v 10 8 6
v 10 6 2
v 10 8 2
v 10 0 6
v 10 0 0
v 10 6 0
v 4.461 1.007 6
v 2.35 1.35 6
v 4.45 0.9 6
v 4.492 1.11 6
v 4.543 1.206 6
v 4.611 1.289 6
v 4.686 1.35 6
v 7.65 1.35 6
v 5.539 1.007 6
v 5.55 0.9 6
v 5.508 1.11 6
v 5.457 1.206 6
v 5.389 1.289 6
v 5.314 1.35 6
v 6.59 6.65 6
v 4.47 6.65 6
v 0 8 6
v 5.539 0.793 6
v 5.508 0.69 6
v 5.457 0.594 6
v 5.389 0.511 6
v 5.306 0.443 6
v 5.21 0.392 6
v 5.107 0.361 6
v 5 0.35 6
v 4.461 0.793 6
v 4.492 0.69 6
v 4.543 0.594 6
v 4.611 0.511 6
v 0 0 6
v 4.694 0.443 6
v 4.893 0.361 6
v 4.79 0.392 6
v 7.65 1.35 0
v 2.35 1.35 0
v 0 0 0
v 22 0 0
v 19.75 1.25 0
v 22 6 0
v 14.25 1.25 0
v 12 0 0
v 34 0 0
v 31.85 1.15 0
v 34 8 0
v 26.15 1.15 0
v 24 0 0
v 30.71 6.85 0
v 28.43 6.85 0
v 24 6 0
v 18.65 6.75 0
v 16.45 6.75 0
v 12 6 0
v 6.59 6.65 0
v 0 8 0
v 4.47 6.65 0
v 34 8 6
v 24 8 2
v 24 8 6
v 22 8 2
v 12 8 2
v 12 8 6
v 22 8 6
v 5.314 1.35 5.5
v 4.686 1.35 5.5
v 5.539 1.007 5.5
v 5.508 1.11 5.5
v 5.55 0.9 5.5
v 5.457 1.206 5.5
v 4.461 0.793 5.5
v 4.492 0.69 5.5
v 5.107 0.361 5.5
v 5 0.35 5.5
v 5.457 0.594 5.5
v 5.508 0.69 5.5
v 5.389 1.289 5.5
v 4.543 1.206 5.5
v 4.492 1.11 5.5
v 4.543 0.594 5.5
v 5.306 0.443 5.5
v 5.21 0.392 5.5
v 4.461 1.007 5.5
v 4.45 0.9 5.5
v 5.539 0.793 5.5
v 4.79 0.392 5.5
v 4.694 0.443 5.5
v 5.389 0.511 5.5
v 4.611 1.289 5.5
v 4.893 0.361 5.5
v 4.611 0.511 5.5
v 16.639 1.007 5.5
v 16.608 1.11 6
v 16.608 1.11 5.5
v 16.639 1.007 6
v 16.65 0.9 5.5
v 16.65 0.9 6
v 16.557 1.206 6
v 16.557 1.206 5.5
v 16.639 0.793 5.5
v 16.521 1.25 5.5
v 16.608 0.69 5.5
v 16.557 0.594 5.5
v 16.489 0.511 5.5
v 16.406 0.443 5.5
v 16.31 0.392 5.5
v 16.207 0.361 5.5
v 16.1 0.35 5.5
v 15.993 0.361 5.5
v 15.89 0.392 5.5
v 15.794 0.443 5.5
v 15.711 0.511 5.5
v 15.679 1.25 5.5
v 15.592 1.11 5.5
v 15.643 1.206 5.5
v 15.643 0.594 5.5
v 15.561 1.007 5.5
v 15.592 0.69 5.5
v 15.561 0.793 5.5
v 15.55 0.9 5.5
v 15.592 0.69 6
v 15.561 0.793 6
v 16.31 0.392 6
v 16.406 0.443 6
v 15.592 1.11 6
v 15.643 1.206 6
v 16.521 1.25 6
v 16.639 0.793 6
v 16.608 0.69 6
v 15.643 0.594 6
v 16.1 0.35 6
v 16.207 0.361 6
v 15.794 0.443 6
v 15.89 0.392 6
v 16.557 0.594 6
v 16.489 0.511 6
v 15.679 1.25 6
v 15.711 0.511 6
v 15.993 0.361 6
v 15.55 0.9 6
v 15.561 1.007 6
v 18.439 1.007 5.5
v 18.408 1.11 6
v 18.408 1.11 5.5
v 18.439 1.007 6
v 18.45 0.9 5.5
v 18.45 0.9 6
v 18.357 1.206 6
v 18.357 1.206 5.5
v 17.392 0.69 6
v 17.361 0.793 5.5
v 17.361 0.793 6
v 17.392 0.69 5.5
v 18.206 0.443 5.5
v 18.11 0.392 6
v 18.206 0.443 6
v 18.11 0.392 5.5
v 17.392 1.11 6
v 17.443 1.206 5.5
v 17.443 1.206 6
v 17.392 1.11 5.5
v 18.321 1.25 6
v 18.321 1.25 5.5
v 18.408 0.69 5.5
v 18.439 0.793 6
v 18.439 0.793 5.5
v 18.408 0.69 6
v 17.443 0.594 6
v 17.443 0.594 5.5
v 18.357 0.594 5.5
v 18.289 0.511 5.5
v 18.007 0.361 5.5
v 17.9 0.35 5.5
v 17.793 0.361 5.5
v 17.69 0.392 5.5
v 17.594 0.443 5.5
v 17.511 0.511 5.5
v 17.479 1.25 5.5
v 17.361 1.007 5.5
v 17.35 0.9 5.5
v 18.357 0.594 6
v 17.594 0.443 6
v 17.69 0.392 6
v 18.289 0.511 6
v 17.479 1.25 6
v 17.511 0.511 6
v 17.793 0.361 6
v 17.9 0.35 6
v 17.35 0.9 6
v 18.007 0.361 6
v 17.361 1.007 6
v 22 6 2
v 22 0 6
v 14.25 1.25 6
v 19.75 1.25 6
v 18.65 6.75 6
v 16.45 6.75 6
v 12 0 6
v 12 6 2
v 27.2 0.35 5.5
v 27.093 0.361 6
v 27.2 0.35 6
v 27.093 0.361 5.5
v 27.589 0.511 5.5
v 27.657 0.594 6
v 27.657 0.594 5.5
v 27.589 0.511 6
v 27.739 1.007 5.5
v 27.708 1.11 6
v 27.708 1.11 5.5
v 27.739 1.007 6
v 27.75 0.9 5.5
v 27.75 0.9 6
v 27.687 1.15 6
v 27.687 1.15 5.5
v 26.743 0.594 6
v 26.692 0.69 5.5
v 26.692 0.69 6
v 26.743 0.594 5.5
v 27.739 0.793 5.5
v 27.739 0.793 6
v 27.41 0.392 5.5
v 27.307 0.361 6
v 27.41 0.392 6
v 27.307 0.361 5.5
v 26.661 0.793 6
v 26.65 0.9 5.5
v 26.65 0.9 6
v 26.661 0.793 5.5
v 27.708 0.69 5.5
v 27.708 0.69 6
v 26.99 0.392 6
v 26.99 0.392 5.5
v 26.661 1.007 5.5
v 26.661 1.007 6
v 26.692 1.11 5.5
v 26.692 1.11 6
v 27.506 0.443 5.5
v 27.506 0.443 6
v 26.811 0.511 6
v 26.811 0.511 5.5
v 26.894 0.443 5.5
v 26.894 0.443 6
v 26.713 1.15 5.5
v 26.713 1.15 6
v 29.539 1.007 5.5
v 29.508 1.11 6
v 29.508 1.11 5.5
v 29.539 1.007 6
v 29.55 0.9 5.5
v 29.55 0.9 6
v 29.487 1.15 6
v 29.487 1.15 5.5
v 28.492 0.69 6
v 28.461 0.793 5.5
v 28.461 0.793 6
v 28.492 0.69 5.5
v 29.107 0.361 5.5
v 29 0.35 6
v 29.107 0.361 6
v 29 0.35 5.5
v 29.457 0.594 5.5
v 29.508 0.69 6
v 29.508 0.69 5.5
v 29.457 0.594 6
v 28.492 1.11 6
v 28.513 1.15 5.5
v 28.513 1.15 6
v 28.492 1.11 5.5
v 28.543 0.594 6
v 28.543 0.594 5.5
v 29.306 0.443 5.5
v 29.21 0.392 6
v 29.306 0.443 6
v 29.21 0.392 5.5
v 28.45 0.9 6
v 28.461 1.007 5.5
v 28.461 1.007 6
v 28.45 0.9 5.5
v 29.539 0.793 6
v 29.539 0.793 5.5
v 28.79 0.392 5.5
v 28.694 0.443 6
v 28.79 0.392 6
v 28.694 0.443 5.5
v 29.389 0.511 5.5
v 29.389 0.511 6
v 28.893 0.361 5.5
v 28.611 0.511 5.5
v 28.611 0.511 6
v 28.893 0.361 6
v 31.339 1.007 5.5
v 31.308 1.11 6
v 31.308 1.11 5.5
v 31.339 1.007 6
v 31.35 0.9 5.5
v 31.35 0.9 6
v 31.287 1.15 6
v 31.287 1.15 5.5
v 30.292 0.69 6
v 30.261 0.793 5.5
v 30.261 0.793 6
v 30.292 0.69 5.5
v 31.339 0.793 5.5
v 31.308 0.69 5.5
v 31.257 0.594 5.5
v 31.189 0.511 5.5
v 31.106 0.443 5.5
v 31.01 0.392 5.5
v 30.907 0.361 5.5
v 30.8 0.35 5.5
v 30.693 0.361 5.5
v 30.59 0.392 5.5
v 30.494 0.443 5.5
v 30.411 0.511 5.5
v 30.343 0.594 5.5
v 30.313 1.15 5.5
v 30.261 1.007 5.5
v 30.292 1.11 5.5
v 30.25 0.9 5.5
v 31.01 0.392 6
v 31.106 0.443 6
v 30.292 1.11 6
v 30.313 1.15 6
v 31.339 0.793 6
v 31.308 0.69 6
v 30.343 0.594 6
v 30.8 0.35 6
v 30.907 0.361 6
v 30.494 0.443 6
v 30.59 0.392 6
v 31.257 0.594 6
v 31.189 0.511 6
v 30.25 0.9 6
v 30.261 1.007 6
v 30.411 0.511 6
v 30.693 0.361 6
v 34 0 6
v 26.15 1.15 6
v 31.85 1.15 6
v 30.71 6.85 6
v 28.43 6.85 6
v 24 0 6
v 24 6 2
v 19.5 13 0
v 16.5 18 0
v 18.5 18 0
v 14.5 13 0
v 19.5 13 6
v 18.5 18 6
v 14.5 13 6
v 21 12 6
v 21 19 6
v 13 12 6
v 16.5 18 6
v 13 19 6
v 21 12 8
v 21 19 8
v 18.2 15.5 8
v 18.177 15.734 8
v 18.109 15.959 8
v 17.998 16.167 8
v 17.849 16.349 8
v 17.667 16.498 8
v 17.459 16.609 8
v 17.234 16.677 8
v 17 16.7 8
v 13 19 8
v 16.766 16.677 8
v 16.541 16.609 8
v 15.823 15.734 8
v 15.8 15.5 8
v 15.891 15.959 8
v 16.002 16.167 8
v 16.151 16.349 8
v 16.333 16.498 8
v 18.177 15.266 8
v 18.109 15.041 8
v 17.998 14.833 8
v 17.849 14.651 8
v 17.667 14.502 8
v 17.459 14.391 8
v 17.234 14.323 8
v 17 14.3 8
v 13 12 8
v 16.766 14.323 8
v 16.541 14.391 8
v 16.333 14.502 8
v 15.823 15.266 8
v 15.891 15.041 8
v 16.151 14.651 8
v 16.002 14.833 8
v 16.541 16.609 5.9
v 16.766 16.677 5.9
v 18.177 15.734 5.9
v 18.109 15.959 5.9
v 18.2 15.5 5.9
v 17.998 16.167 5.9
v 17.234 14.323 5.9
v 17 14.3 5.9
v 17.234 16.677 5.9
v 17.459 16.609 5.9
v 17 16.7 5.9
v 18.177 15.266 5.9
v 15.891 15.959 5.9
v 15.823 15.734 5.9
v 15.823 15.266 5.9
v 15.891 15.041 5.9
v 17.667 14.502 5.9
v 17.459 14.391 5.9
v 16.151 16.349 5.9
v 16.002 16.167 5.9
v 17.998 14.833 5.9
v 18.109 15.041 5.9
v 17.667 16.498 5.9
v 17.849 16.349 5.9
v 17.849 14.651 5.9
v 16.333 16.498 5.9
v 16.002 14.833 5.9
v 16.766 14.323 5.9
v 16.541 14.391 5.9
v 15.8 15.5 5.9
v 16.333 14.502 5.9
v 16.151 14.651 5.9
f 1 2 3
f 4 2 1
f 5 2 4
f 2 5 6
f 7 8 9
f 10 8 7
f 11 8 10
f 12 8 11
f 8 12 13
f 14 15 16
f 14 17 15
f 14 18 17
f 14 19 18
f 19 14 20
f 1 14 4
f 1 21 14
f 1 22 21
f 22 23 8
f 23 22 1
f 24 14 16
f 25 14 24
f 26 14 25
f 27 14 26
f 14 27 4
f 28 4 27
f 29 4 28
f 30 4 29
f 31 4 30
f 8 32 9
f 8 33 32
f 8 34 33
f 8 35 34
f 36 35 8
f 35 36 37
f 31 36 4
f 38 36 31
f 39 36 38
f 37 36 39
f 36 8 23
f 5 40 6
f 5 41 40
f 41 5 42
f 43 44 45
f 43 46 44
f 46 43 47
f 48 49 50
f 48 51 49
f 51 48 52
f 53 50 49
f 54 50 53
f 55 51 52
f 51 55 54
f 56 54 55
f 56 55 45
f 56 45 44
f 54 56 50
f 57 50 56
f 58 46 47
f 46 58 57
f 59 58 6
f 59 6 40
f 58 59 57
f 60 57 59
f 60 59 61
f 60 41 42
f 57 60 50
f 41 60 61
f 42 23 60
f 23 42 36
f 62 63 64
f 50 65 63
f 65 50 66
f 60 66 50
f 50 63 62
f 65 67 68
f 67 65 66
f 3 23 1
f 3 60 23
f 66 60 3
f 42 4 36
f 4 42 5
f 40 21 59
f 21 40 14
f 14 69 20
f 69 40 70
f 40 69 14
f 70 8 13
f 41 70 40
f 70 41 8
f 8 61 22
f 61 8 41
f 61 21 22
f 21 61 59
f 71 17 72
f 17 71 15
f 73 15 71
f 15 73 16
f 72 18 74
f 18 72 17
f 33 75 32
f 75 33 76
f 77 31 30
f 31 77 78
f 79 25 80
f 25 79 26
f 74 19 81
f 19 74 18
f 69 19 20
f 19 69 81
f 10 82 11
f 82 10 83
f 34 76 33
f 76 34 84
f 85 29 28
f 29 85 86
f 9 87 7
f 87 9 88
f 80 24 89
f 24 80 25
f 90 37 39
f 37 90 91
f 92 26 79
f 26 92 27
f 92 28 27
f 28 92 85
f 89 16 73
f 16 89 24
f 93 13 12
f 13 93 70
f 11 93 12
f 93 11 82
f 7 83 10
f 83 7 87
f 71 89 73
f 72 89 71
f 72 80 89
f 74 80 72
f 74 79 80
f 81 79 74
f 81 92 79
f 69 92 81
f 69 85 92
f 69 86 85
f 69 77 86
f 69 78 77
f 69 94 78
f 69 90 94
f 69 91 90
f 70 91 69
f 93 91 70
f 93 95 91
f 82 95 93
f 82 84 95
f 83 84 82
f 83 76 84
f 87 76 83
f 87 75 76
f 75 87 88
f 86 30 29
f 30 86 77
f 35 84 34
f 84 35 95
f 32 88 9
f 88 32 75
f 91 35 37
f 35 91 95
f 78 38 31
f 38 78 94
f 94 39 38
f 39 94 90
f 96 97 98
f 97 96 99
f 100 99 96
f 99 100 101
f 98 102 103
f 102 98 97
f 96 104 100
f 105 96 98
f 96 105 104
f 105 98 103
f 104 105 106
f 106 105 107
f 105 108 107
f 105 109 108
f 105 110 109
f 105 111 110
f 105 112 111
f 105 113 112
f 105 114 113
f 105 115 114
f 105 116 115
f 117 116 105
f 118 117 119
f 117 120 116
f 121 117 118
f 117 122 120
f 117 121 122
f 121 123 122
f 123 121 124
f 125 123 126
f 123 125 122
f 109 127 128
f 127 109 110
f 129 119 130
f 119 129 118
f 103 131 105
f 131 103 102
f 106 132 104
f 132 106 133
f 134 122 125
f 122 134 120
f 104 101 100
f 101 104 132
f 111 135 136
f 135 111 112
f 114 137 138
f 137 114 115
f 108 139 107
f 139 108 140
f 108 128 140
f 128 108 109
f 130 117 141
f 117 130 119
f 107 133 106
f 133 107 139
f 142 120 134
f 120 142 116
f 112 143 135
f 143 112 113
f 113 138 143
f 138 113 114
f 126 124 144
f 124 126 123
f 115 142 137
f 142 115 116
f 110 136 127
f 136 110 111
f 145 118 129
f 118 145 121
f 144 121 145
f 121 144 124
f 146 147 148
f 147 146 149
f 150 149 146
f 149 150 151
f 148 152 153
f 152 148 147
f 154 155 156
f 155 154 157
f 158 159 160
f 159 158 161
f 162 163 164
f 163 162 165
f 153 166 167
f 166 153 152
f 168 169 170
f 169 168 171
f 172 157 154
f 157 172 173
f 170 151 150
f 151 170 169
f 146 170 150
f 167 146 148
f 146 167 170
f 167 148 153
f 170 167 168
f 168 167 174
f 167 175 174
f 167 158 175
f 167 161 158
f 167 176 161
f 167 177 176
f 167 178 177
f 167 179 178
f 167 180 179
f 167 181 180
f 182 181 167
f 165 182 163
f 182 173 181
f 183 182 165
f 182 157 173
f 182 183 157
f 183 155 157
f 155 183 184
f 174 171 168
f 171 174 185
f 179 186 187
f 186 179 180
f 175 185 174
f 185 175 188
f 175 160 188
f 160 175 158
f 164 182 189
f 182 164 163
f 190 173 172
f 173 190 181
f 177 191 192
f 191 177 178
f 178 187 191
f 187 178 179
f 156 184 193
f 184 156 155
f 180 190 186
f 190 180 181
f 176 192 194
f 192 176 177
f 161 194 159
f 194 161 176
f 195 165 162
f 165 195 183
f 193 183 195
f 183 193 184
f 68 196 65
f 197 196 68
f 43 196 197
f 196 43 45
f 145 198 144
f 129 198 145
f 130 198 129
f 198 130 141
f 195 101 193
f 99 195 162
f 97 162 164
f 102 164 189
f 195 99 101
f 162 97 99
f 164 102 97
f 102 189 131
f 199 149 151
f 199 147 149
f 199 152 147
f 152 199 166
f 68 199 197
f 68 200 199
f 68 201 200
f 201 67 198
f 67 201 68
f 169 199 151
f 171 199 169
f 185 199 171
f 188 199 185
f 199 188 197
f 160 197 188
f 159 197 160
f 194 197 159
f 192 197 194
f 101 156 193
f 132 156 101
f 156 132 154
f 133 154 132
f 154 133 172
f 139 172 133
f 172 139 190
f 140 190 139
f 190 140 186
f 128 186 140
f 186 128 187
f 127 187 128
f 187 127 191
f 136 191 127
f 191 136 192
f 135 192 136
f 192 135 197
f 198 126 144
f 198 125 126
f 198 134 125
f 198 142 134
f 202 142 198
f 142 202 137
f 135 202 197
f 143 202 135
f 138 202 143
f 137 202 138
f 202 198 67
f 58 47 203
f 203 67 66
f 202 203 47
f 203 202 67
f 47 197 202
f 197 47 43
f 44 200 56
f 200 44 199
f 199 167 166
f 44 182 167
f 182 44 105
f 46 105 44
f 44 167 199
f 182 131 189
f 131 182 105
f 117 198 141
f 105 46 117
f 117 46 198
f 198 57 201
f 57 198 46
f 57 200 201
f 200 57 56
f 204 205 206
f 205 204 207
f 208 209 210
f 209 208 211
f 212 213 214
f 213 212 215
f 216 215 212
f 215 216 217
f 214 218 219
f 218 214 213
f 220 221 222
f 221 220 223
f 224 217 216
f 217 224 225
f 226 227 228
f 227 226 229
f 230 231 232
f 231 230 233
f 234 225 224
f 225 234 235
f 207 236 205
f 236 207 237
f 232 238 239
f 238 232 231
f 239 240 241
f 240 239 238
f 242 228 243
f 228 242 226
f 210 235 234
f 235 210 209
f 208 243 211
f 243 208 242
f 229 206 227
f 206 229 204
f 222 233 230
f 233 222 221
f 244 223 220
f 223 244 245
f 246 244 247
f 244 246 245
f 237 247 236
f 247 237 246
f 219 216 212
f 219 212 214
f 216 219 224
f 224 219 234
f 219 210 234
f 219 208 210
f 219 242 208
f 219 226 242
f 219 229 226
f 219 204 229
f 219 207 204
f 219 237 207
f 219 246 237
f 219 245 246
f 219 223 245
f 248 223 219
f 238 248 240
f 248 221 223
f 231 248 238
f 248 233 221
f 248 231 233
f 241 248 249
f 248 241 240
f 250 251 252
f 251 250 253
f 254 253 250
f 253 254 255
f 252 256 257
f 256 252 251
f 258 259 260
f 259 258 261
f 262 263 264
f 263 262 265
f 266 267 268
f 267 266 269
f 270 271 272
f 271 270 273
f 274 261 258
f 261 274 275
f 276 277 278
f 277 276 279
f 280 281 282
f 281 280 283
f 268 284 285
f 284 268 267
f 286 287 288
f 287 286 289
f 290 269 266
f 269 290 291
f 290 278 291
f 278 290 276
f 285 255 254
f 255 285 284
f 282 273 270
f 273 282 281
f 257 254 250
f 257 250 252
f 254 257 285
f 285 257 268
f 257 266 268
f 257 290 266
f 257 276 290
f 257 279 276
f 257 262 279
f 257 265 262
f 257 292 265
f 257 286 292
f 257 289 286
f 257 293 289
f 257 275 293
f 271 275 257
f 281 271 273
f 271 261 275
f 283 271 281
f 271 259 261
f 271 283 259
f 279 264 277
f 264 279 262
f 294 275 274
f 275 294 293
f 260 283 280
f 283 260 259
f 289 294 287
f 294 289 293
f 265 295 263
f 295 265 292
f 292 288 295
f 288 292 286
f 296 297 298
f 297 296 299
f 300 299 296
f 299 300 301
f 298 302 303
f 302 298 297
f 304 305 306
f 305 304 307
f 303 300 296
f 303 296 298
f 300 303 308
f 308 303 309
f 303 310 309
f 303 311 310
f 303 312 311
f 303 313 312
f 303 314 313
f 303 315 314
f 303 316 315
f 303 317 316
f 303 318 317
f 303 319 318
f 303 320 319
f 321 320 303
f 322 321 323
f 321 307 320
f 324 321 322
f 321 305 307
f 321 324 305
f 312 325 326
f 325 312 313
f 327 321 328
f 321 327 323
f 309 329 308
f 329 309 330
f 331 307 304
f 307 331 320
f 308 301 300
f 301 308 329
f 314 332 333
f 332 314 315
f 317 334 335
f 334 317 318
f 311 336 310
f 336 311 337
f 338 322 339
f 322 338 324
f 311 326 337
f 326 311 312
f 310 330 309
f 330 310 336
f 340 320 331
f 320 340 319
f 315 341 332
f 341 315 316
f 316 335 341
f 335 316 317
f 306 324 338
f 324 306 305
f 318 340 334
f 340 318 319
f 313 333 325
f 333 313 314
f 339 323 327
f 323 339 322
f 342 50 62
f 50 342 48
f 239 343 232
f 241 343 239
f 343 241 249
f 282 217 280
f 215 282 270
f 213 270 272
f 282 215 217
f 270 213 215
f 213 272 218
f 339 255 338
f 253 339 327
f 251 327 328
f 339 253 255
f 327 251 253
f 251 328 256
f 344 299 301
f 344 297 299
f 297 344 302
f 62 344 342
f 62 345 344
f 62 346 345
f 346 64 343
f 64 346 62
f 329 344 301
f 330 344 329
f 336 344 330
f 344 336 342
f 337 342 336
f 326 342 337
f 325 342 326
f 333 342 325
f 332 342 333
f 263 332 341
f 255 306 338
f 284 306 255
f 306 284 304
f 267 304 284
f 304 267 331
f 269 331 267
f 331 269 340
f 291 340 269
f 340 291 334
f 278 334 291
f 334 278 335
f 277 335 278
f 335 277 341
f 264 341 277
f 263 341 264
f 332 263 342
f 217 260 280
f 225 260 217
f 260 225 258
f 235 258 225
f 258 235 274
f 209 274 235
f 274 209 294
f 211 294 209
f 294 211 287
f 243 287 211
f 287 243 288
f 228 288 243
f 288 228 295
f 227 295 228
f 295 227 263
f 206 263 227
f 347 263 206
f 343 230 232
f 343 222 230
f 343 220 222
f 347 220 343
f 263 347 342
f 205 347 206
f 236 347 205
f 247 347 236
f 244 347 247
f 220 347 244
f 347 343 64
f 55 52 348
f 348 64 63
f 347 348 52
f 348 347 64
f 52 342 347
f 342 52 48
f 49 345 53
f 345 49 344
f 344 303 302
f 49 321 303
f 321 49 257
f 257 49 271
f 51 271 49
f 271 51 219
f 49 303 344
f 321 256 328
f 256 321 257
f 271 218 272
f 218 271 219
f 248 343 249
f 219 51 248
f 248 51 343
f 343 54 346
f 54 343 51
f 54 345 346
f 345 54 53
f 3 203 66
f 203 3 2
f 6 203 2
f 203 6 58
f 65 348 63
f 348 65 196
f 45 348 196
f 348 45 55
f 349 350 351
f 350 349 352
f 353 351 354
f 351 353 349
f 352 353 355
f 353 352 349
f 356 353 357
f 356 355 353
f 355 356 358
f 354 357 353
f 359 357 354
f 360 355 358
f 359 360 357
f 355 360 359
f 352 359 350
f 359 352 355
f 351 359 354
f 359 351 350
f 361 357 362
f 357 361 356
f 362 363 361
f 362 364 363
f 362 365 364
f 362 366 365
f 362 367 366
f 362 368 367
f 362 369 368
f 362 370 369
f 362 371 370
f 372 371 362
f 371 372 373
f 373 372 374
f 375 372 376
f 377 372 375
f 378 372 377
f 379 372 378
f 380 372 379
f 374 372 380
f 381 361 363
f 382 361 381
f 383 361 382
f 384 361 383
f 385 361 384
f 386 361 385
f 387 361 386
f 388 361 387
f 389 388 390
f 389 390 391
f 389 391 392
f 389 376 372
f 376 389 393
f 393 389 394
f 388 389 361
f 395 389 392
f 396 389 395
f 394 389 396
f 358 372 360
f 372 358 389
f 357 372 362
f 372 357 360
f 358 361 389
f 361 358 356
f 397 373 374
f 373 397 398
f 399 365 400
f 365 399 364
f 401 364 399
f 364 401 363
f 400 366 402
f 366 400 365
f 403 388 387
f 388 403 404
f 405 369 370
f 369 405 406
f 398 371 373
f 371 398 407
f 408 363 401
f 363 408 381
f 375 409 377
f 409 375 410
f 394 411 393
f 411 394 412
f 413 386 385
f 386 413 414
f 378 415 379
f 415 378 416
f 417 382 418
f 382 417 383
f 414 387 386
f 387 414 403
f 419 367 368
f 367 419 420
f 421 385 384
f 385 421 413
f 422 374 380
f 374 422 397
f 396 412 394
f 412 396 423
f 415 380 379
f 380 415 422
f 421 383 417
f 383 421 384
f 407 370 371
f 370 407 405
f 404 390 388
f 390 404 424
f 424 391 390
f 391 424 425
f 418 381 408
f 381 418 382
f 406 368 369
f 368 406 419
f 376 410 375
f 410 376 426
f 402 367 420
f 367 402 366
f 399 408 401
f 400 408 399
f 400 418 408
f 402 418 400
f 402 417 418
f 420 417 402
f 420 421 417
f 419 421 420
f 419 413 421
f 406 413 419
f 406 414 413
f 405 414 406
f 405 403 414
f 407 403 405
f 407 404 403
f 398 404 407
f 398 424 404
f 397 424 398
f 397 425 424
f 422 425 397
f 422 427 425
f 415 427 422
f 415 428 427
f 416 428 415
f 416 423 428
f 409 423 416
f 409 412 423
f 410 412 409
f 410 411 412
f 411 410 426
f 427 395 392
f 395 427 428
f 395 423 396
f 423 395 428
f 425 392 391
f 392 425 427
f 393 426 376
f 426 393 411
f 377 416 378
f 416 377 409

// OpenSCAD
// file: ../components/vendor/jointscad/DovetailJoint.scad
function getDovetailCorners(dimensions) = [
    [0, 0],
    [getDovetailLargeWidth(dimensions[0]), 0],
    [dimensions[0], dimensions[1]],
    [dimensions[0]/2, dimensions[1]]
];
function getDovetailTranslations(numberOfDovetails, largeWidth) = [
    for(i = [0: numberOfDovetails-1])
        [getXSpacing(largeWidth, i), 0, 0]
];
function getDovetailLargeWidth(width) = width * 1.25;
function getDovetailBaseWidth(width) = width * 0.8;
function getXSpacing(largeWidth, index) = largeWidth/2 + (index * largeWidth * 2);

module dovetail(dimensions) {
    corners = getDovetailCorners(dimensions);

    linear_extrude(height = dimensions[2]) {
        polygon(corners);
    }
}

module dovetailJointA(dimensions, numberOfDovetails) {
    width = dimensions[0];
    length = dimensions[1];
    height = dimensions[2];

    dovetailLargeWidth = width/(numberOfDovetails*2);
    dovetailBaseWidth = getDovetailBaseWidth(dovetailLargeWidth);

    for(t=getDovetailTranslations(numberOfDovetails, dovetailLargeWidth)) {
        translate(t) {
            dovetail([dovetailBaseWidth, length, height]);
        }
    }
}

module dovetailJointB(dimensions, numberOfDovetails) {
    difference() {
        cube(dimensions);
        dovetailJointA(dimensions, numberOfDovetails);
    }
}
// main file
/*
Small sliding-clearance coupon based on JointSCAD's dovetail profile.
Upstream: https://github.com/HopefulLlama/JointSCAD
Pinned source commit: 447888065b30721267db6011faeaf8e4e95ee5ff
License: MIT
*/

use <../components/vendor/jointscad/DovetailJoint.scad>

$fn = 32;
part_id = 0; // 0 = print plate, 1 = receiver rack, 2 = key, 3 = assembly preview

// Per-side XY clearance: 1 dimple = 0.15, 2 = 0.25, 3 = 0.35 mm.
clearances = [0.15, 0.25, 0.35];
joint_dimensions = [10, 5, 6];
receiver_dimensions = [10, 8, 6];
receiver_gap = 2;
cut_epsilon = 0.2;

module clearance_cutout(clearance) {
    profile_width = joint_dimensions[0] / 2;
    scale_x = (profile_width + 2 * clearance) / profile_width;
    scale_y = (joint_dimensions[1] + 2 * clearance) / joint_dimensions[1];
    center_x = joint_dimensions[0] / 2;
    center_y = joint_dimensions[1] / 2;

    translate([center_x, center_y, -cut_epsilon])
        scale([scale_x, scale_y, 1])
            translate([-center_x, -center_y, 0])
                dovetailJointA([
                    joint_dimensions[0],
                    joint_dimensions[1],
                    joint_dimensions[2] + 2 * cut_epsilon
                ], 1);
}

module receiver(clearance, marker_count) {
    difference() {
        cube(receiver_dimensions);

        translate([0, (receiver_dimensions[1] - joint_dimensions[1]) / 2, 0])
            clearance_cutout(clearance);

        // Dimples identify the clearance after the rack leaves the print bed.
        for (marker = [0 : marker_count - 1])
            translate([
                receiver_dimensions[0] / 2 + (marker - (marker_count - 1) / 2) * 1.8,
                0.9,
                receiver_dimensions[2] - 0.5
            ])
                cylinder(h = 0.7, r = 0.55);
    }
}

module receiver_rack() {
    for (index = [0 : len(clearances) - 1])
        translate([index * (receiver_dimensions[0] + receiver_gap), 0, 0])
            receiver(clearances[index], index + 1);

    // Rear bridges keep the receivers indexed without closing either channel end.
    for (index = [0 : len(clearances) - 2])
        translate([
            (index + 1) * receiver_dimensions[0] + index * receiver_gap,
            receiver_dimensions[1] - 2,
            0
        ])
            cube([receiver_gap, 2, 2]);
}

module dovetail_key() {
    difference() {
        union() {
            dovetailJointA(joint_dimensions, 1);
            translate([1, -1, joint_dimensions[2]])
                cube([8, 7, 2]);
        }

        // Finger hole in the stop/handle.
        translate([joint_dimensions[0] / 2, joint_dimensions[1] / 2, joint_dimensions[2] - 0.1])
            cylinder(h = 2.2, r = 1.2);
    }
}

module print_plate() {
    receiver_rack();
    translate([12, 13, 0]) dovetail_key();
}

module assembly_preview() {
    color("gold") receiver_rack();
    color("deepskyblue", 0.75)
        translate([
            receiver_dimensions[0] + receiver_gap,
            (receiver_dimensions[1] - joint_dimensions[1]) / 2,
            3
        ])
            dovetail_key();
}

if (part_id == 1) {
    receiver_rack();
} else if (part_id == 2) {
    dovetail_key();
} else if (part_id == 3) {
    assembly_preview();
} else {
    print_plate();
}
